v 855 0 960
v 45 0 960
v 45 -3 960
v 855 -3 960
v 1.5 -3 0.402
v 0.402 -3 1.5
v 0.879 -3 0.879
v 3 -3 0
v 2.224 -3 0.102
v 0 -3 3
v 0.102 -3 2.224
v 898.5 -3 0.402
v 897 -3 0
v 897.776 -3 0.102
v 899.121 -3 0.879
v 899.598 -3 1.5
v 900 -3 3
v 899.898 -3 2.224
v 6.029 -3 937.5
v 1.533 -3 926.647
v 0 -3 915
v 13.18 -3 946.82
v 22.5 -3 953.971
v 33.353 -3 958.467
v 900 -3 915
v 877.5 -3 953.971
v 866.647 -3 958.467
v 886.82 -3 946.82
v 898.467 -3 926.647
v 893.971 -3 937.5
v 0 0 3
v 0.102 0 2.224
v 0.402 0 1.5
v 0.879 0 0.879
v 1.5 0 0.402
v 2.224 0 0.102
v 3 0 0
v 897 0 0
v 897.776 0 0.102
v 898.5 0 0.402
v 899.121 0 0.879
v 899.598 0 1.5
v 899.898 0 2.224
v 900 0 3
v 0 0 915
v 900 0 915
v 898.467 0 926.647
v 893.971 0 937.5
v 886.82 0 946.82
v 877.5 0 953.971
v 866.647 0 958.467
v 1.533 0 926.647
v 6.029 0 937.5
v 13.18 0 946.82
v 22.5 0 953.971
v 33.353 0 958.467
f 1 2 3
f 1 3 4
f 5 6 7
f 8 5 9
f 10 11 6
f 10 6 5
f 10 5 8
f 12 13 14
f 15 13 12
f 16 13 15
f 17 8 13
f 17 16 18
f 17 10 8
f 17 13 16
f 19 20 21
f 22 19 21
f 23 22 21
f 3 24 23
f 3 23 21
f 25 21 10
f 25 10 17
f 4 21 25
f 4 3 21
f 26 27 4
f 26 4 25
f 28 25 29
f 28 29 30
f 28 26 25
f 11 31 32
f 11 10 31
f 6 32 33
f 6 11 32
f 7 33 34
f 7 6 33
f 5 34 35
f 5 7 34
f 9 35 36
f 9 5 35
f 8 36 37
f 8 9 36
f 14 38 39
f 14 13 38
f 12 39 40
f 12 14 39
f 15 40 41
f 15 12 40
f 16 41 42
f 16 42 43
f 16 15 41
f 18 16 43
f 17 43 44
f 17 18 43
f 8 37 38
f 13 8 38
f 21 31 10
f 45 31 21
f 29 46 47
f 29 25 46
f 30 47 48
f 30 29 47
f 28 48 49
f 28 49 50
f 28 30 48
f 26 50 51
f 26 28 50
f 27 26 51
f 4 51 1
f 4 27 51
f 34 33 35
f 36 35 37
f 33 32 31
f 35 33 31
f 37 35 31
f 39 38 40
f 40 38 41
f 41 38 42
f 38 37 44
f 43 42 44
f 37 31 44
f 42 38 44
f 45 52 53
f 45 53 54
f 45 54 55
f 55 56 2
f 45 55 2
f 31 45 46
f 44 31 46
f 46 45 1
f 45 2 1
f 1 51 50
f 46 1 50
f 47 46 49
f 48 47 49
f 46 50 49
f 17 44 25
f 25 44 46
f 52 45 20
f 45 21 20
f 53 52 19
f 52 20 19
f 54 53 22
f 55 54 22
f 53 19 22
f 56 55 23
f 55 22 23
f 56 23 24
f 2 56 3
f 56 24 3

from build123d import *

# Parameters (mm, degrees)
F0_W     = 900
F0_H     = 960
F1_DEPTH = 3
F2_R     = 45
F3_R     = 3


with BuildPart() as f1:
    # F0 (on Front) → F1 (new body)
    with BuildSketch(Plane.XZ):
        with Locations((450, 480)):
            Rectangle(F0_W, F0_H)
    extrude(amount=F1_DEPTH)

    # F2
    f2_edges = [f1.edges().sort_by_distance(p)[0] for p in [
        (900, -1.5, 960),
        (0, -1.5, 960),
    ]]
    fillet(f2_edges, radius=F2_R)

    # F3
    f3_edges = [f1.edges().sort_by_distance(p)[0] for p in [
        (900, -1.5, 0),
        (0, -1.5, 0),
    ]]
    fillet(f3_edges, radius=F3_R)


solid = f1.part
